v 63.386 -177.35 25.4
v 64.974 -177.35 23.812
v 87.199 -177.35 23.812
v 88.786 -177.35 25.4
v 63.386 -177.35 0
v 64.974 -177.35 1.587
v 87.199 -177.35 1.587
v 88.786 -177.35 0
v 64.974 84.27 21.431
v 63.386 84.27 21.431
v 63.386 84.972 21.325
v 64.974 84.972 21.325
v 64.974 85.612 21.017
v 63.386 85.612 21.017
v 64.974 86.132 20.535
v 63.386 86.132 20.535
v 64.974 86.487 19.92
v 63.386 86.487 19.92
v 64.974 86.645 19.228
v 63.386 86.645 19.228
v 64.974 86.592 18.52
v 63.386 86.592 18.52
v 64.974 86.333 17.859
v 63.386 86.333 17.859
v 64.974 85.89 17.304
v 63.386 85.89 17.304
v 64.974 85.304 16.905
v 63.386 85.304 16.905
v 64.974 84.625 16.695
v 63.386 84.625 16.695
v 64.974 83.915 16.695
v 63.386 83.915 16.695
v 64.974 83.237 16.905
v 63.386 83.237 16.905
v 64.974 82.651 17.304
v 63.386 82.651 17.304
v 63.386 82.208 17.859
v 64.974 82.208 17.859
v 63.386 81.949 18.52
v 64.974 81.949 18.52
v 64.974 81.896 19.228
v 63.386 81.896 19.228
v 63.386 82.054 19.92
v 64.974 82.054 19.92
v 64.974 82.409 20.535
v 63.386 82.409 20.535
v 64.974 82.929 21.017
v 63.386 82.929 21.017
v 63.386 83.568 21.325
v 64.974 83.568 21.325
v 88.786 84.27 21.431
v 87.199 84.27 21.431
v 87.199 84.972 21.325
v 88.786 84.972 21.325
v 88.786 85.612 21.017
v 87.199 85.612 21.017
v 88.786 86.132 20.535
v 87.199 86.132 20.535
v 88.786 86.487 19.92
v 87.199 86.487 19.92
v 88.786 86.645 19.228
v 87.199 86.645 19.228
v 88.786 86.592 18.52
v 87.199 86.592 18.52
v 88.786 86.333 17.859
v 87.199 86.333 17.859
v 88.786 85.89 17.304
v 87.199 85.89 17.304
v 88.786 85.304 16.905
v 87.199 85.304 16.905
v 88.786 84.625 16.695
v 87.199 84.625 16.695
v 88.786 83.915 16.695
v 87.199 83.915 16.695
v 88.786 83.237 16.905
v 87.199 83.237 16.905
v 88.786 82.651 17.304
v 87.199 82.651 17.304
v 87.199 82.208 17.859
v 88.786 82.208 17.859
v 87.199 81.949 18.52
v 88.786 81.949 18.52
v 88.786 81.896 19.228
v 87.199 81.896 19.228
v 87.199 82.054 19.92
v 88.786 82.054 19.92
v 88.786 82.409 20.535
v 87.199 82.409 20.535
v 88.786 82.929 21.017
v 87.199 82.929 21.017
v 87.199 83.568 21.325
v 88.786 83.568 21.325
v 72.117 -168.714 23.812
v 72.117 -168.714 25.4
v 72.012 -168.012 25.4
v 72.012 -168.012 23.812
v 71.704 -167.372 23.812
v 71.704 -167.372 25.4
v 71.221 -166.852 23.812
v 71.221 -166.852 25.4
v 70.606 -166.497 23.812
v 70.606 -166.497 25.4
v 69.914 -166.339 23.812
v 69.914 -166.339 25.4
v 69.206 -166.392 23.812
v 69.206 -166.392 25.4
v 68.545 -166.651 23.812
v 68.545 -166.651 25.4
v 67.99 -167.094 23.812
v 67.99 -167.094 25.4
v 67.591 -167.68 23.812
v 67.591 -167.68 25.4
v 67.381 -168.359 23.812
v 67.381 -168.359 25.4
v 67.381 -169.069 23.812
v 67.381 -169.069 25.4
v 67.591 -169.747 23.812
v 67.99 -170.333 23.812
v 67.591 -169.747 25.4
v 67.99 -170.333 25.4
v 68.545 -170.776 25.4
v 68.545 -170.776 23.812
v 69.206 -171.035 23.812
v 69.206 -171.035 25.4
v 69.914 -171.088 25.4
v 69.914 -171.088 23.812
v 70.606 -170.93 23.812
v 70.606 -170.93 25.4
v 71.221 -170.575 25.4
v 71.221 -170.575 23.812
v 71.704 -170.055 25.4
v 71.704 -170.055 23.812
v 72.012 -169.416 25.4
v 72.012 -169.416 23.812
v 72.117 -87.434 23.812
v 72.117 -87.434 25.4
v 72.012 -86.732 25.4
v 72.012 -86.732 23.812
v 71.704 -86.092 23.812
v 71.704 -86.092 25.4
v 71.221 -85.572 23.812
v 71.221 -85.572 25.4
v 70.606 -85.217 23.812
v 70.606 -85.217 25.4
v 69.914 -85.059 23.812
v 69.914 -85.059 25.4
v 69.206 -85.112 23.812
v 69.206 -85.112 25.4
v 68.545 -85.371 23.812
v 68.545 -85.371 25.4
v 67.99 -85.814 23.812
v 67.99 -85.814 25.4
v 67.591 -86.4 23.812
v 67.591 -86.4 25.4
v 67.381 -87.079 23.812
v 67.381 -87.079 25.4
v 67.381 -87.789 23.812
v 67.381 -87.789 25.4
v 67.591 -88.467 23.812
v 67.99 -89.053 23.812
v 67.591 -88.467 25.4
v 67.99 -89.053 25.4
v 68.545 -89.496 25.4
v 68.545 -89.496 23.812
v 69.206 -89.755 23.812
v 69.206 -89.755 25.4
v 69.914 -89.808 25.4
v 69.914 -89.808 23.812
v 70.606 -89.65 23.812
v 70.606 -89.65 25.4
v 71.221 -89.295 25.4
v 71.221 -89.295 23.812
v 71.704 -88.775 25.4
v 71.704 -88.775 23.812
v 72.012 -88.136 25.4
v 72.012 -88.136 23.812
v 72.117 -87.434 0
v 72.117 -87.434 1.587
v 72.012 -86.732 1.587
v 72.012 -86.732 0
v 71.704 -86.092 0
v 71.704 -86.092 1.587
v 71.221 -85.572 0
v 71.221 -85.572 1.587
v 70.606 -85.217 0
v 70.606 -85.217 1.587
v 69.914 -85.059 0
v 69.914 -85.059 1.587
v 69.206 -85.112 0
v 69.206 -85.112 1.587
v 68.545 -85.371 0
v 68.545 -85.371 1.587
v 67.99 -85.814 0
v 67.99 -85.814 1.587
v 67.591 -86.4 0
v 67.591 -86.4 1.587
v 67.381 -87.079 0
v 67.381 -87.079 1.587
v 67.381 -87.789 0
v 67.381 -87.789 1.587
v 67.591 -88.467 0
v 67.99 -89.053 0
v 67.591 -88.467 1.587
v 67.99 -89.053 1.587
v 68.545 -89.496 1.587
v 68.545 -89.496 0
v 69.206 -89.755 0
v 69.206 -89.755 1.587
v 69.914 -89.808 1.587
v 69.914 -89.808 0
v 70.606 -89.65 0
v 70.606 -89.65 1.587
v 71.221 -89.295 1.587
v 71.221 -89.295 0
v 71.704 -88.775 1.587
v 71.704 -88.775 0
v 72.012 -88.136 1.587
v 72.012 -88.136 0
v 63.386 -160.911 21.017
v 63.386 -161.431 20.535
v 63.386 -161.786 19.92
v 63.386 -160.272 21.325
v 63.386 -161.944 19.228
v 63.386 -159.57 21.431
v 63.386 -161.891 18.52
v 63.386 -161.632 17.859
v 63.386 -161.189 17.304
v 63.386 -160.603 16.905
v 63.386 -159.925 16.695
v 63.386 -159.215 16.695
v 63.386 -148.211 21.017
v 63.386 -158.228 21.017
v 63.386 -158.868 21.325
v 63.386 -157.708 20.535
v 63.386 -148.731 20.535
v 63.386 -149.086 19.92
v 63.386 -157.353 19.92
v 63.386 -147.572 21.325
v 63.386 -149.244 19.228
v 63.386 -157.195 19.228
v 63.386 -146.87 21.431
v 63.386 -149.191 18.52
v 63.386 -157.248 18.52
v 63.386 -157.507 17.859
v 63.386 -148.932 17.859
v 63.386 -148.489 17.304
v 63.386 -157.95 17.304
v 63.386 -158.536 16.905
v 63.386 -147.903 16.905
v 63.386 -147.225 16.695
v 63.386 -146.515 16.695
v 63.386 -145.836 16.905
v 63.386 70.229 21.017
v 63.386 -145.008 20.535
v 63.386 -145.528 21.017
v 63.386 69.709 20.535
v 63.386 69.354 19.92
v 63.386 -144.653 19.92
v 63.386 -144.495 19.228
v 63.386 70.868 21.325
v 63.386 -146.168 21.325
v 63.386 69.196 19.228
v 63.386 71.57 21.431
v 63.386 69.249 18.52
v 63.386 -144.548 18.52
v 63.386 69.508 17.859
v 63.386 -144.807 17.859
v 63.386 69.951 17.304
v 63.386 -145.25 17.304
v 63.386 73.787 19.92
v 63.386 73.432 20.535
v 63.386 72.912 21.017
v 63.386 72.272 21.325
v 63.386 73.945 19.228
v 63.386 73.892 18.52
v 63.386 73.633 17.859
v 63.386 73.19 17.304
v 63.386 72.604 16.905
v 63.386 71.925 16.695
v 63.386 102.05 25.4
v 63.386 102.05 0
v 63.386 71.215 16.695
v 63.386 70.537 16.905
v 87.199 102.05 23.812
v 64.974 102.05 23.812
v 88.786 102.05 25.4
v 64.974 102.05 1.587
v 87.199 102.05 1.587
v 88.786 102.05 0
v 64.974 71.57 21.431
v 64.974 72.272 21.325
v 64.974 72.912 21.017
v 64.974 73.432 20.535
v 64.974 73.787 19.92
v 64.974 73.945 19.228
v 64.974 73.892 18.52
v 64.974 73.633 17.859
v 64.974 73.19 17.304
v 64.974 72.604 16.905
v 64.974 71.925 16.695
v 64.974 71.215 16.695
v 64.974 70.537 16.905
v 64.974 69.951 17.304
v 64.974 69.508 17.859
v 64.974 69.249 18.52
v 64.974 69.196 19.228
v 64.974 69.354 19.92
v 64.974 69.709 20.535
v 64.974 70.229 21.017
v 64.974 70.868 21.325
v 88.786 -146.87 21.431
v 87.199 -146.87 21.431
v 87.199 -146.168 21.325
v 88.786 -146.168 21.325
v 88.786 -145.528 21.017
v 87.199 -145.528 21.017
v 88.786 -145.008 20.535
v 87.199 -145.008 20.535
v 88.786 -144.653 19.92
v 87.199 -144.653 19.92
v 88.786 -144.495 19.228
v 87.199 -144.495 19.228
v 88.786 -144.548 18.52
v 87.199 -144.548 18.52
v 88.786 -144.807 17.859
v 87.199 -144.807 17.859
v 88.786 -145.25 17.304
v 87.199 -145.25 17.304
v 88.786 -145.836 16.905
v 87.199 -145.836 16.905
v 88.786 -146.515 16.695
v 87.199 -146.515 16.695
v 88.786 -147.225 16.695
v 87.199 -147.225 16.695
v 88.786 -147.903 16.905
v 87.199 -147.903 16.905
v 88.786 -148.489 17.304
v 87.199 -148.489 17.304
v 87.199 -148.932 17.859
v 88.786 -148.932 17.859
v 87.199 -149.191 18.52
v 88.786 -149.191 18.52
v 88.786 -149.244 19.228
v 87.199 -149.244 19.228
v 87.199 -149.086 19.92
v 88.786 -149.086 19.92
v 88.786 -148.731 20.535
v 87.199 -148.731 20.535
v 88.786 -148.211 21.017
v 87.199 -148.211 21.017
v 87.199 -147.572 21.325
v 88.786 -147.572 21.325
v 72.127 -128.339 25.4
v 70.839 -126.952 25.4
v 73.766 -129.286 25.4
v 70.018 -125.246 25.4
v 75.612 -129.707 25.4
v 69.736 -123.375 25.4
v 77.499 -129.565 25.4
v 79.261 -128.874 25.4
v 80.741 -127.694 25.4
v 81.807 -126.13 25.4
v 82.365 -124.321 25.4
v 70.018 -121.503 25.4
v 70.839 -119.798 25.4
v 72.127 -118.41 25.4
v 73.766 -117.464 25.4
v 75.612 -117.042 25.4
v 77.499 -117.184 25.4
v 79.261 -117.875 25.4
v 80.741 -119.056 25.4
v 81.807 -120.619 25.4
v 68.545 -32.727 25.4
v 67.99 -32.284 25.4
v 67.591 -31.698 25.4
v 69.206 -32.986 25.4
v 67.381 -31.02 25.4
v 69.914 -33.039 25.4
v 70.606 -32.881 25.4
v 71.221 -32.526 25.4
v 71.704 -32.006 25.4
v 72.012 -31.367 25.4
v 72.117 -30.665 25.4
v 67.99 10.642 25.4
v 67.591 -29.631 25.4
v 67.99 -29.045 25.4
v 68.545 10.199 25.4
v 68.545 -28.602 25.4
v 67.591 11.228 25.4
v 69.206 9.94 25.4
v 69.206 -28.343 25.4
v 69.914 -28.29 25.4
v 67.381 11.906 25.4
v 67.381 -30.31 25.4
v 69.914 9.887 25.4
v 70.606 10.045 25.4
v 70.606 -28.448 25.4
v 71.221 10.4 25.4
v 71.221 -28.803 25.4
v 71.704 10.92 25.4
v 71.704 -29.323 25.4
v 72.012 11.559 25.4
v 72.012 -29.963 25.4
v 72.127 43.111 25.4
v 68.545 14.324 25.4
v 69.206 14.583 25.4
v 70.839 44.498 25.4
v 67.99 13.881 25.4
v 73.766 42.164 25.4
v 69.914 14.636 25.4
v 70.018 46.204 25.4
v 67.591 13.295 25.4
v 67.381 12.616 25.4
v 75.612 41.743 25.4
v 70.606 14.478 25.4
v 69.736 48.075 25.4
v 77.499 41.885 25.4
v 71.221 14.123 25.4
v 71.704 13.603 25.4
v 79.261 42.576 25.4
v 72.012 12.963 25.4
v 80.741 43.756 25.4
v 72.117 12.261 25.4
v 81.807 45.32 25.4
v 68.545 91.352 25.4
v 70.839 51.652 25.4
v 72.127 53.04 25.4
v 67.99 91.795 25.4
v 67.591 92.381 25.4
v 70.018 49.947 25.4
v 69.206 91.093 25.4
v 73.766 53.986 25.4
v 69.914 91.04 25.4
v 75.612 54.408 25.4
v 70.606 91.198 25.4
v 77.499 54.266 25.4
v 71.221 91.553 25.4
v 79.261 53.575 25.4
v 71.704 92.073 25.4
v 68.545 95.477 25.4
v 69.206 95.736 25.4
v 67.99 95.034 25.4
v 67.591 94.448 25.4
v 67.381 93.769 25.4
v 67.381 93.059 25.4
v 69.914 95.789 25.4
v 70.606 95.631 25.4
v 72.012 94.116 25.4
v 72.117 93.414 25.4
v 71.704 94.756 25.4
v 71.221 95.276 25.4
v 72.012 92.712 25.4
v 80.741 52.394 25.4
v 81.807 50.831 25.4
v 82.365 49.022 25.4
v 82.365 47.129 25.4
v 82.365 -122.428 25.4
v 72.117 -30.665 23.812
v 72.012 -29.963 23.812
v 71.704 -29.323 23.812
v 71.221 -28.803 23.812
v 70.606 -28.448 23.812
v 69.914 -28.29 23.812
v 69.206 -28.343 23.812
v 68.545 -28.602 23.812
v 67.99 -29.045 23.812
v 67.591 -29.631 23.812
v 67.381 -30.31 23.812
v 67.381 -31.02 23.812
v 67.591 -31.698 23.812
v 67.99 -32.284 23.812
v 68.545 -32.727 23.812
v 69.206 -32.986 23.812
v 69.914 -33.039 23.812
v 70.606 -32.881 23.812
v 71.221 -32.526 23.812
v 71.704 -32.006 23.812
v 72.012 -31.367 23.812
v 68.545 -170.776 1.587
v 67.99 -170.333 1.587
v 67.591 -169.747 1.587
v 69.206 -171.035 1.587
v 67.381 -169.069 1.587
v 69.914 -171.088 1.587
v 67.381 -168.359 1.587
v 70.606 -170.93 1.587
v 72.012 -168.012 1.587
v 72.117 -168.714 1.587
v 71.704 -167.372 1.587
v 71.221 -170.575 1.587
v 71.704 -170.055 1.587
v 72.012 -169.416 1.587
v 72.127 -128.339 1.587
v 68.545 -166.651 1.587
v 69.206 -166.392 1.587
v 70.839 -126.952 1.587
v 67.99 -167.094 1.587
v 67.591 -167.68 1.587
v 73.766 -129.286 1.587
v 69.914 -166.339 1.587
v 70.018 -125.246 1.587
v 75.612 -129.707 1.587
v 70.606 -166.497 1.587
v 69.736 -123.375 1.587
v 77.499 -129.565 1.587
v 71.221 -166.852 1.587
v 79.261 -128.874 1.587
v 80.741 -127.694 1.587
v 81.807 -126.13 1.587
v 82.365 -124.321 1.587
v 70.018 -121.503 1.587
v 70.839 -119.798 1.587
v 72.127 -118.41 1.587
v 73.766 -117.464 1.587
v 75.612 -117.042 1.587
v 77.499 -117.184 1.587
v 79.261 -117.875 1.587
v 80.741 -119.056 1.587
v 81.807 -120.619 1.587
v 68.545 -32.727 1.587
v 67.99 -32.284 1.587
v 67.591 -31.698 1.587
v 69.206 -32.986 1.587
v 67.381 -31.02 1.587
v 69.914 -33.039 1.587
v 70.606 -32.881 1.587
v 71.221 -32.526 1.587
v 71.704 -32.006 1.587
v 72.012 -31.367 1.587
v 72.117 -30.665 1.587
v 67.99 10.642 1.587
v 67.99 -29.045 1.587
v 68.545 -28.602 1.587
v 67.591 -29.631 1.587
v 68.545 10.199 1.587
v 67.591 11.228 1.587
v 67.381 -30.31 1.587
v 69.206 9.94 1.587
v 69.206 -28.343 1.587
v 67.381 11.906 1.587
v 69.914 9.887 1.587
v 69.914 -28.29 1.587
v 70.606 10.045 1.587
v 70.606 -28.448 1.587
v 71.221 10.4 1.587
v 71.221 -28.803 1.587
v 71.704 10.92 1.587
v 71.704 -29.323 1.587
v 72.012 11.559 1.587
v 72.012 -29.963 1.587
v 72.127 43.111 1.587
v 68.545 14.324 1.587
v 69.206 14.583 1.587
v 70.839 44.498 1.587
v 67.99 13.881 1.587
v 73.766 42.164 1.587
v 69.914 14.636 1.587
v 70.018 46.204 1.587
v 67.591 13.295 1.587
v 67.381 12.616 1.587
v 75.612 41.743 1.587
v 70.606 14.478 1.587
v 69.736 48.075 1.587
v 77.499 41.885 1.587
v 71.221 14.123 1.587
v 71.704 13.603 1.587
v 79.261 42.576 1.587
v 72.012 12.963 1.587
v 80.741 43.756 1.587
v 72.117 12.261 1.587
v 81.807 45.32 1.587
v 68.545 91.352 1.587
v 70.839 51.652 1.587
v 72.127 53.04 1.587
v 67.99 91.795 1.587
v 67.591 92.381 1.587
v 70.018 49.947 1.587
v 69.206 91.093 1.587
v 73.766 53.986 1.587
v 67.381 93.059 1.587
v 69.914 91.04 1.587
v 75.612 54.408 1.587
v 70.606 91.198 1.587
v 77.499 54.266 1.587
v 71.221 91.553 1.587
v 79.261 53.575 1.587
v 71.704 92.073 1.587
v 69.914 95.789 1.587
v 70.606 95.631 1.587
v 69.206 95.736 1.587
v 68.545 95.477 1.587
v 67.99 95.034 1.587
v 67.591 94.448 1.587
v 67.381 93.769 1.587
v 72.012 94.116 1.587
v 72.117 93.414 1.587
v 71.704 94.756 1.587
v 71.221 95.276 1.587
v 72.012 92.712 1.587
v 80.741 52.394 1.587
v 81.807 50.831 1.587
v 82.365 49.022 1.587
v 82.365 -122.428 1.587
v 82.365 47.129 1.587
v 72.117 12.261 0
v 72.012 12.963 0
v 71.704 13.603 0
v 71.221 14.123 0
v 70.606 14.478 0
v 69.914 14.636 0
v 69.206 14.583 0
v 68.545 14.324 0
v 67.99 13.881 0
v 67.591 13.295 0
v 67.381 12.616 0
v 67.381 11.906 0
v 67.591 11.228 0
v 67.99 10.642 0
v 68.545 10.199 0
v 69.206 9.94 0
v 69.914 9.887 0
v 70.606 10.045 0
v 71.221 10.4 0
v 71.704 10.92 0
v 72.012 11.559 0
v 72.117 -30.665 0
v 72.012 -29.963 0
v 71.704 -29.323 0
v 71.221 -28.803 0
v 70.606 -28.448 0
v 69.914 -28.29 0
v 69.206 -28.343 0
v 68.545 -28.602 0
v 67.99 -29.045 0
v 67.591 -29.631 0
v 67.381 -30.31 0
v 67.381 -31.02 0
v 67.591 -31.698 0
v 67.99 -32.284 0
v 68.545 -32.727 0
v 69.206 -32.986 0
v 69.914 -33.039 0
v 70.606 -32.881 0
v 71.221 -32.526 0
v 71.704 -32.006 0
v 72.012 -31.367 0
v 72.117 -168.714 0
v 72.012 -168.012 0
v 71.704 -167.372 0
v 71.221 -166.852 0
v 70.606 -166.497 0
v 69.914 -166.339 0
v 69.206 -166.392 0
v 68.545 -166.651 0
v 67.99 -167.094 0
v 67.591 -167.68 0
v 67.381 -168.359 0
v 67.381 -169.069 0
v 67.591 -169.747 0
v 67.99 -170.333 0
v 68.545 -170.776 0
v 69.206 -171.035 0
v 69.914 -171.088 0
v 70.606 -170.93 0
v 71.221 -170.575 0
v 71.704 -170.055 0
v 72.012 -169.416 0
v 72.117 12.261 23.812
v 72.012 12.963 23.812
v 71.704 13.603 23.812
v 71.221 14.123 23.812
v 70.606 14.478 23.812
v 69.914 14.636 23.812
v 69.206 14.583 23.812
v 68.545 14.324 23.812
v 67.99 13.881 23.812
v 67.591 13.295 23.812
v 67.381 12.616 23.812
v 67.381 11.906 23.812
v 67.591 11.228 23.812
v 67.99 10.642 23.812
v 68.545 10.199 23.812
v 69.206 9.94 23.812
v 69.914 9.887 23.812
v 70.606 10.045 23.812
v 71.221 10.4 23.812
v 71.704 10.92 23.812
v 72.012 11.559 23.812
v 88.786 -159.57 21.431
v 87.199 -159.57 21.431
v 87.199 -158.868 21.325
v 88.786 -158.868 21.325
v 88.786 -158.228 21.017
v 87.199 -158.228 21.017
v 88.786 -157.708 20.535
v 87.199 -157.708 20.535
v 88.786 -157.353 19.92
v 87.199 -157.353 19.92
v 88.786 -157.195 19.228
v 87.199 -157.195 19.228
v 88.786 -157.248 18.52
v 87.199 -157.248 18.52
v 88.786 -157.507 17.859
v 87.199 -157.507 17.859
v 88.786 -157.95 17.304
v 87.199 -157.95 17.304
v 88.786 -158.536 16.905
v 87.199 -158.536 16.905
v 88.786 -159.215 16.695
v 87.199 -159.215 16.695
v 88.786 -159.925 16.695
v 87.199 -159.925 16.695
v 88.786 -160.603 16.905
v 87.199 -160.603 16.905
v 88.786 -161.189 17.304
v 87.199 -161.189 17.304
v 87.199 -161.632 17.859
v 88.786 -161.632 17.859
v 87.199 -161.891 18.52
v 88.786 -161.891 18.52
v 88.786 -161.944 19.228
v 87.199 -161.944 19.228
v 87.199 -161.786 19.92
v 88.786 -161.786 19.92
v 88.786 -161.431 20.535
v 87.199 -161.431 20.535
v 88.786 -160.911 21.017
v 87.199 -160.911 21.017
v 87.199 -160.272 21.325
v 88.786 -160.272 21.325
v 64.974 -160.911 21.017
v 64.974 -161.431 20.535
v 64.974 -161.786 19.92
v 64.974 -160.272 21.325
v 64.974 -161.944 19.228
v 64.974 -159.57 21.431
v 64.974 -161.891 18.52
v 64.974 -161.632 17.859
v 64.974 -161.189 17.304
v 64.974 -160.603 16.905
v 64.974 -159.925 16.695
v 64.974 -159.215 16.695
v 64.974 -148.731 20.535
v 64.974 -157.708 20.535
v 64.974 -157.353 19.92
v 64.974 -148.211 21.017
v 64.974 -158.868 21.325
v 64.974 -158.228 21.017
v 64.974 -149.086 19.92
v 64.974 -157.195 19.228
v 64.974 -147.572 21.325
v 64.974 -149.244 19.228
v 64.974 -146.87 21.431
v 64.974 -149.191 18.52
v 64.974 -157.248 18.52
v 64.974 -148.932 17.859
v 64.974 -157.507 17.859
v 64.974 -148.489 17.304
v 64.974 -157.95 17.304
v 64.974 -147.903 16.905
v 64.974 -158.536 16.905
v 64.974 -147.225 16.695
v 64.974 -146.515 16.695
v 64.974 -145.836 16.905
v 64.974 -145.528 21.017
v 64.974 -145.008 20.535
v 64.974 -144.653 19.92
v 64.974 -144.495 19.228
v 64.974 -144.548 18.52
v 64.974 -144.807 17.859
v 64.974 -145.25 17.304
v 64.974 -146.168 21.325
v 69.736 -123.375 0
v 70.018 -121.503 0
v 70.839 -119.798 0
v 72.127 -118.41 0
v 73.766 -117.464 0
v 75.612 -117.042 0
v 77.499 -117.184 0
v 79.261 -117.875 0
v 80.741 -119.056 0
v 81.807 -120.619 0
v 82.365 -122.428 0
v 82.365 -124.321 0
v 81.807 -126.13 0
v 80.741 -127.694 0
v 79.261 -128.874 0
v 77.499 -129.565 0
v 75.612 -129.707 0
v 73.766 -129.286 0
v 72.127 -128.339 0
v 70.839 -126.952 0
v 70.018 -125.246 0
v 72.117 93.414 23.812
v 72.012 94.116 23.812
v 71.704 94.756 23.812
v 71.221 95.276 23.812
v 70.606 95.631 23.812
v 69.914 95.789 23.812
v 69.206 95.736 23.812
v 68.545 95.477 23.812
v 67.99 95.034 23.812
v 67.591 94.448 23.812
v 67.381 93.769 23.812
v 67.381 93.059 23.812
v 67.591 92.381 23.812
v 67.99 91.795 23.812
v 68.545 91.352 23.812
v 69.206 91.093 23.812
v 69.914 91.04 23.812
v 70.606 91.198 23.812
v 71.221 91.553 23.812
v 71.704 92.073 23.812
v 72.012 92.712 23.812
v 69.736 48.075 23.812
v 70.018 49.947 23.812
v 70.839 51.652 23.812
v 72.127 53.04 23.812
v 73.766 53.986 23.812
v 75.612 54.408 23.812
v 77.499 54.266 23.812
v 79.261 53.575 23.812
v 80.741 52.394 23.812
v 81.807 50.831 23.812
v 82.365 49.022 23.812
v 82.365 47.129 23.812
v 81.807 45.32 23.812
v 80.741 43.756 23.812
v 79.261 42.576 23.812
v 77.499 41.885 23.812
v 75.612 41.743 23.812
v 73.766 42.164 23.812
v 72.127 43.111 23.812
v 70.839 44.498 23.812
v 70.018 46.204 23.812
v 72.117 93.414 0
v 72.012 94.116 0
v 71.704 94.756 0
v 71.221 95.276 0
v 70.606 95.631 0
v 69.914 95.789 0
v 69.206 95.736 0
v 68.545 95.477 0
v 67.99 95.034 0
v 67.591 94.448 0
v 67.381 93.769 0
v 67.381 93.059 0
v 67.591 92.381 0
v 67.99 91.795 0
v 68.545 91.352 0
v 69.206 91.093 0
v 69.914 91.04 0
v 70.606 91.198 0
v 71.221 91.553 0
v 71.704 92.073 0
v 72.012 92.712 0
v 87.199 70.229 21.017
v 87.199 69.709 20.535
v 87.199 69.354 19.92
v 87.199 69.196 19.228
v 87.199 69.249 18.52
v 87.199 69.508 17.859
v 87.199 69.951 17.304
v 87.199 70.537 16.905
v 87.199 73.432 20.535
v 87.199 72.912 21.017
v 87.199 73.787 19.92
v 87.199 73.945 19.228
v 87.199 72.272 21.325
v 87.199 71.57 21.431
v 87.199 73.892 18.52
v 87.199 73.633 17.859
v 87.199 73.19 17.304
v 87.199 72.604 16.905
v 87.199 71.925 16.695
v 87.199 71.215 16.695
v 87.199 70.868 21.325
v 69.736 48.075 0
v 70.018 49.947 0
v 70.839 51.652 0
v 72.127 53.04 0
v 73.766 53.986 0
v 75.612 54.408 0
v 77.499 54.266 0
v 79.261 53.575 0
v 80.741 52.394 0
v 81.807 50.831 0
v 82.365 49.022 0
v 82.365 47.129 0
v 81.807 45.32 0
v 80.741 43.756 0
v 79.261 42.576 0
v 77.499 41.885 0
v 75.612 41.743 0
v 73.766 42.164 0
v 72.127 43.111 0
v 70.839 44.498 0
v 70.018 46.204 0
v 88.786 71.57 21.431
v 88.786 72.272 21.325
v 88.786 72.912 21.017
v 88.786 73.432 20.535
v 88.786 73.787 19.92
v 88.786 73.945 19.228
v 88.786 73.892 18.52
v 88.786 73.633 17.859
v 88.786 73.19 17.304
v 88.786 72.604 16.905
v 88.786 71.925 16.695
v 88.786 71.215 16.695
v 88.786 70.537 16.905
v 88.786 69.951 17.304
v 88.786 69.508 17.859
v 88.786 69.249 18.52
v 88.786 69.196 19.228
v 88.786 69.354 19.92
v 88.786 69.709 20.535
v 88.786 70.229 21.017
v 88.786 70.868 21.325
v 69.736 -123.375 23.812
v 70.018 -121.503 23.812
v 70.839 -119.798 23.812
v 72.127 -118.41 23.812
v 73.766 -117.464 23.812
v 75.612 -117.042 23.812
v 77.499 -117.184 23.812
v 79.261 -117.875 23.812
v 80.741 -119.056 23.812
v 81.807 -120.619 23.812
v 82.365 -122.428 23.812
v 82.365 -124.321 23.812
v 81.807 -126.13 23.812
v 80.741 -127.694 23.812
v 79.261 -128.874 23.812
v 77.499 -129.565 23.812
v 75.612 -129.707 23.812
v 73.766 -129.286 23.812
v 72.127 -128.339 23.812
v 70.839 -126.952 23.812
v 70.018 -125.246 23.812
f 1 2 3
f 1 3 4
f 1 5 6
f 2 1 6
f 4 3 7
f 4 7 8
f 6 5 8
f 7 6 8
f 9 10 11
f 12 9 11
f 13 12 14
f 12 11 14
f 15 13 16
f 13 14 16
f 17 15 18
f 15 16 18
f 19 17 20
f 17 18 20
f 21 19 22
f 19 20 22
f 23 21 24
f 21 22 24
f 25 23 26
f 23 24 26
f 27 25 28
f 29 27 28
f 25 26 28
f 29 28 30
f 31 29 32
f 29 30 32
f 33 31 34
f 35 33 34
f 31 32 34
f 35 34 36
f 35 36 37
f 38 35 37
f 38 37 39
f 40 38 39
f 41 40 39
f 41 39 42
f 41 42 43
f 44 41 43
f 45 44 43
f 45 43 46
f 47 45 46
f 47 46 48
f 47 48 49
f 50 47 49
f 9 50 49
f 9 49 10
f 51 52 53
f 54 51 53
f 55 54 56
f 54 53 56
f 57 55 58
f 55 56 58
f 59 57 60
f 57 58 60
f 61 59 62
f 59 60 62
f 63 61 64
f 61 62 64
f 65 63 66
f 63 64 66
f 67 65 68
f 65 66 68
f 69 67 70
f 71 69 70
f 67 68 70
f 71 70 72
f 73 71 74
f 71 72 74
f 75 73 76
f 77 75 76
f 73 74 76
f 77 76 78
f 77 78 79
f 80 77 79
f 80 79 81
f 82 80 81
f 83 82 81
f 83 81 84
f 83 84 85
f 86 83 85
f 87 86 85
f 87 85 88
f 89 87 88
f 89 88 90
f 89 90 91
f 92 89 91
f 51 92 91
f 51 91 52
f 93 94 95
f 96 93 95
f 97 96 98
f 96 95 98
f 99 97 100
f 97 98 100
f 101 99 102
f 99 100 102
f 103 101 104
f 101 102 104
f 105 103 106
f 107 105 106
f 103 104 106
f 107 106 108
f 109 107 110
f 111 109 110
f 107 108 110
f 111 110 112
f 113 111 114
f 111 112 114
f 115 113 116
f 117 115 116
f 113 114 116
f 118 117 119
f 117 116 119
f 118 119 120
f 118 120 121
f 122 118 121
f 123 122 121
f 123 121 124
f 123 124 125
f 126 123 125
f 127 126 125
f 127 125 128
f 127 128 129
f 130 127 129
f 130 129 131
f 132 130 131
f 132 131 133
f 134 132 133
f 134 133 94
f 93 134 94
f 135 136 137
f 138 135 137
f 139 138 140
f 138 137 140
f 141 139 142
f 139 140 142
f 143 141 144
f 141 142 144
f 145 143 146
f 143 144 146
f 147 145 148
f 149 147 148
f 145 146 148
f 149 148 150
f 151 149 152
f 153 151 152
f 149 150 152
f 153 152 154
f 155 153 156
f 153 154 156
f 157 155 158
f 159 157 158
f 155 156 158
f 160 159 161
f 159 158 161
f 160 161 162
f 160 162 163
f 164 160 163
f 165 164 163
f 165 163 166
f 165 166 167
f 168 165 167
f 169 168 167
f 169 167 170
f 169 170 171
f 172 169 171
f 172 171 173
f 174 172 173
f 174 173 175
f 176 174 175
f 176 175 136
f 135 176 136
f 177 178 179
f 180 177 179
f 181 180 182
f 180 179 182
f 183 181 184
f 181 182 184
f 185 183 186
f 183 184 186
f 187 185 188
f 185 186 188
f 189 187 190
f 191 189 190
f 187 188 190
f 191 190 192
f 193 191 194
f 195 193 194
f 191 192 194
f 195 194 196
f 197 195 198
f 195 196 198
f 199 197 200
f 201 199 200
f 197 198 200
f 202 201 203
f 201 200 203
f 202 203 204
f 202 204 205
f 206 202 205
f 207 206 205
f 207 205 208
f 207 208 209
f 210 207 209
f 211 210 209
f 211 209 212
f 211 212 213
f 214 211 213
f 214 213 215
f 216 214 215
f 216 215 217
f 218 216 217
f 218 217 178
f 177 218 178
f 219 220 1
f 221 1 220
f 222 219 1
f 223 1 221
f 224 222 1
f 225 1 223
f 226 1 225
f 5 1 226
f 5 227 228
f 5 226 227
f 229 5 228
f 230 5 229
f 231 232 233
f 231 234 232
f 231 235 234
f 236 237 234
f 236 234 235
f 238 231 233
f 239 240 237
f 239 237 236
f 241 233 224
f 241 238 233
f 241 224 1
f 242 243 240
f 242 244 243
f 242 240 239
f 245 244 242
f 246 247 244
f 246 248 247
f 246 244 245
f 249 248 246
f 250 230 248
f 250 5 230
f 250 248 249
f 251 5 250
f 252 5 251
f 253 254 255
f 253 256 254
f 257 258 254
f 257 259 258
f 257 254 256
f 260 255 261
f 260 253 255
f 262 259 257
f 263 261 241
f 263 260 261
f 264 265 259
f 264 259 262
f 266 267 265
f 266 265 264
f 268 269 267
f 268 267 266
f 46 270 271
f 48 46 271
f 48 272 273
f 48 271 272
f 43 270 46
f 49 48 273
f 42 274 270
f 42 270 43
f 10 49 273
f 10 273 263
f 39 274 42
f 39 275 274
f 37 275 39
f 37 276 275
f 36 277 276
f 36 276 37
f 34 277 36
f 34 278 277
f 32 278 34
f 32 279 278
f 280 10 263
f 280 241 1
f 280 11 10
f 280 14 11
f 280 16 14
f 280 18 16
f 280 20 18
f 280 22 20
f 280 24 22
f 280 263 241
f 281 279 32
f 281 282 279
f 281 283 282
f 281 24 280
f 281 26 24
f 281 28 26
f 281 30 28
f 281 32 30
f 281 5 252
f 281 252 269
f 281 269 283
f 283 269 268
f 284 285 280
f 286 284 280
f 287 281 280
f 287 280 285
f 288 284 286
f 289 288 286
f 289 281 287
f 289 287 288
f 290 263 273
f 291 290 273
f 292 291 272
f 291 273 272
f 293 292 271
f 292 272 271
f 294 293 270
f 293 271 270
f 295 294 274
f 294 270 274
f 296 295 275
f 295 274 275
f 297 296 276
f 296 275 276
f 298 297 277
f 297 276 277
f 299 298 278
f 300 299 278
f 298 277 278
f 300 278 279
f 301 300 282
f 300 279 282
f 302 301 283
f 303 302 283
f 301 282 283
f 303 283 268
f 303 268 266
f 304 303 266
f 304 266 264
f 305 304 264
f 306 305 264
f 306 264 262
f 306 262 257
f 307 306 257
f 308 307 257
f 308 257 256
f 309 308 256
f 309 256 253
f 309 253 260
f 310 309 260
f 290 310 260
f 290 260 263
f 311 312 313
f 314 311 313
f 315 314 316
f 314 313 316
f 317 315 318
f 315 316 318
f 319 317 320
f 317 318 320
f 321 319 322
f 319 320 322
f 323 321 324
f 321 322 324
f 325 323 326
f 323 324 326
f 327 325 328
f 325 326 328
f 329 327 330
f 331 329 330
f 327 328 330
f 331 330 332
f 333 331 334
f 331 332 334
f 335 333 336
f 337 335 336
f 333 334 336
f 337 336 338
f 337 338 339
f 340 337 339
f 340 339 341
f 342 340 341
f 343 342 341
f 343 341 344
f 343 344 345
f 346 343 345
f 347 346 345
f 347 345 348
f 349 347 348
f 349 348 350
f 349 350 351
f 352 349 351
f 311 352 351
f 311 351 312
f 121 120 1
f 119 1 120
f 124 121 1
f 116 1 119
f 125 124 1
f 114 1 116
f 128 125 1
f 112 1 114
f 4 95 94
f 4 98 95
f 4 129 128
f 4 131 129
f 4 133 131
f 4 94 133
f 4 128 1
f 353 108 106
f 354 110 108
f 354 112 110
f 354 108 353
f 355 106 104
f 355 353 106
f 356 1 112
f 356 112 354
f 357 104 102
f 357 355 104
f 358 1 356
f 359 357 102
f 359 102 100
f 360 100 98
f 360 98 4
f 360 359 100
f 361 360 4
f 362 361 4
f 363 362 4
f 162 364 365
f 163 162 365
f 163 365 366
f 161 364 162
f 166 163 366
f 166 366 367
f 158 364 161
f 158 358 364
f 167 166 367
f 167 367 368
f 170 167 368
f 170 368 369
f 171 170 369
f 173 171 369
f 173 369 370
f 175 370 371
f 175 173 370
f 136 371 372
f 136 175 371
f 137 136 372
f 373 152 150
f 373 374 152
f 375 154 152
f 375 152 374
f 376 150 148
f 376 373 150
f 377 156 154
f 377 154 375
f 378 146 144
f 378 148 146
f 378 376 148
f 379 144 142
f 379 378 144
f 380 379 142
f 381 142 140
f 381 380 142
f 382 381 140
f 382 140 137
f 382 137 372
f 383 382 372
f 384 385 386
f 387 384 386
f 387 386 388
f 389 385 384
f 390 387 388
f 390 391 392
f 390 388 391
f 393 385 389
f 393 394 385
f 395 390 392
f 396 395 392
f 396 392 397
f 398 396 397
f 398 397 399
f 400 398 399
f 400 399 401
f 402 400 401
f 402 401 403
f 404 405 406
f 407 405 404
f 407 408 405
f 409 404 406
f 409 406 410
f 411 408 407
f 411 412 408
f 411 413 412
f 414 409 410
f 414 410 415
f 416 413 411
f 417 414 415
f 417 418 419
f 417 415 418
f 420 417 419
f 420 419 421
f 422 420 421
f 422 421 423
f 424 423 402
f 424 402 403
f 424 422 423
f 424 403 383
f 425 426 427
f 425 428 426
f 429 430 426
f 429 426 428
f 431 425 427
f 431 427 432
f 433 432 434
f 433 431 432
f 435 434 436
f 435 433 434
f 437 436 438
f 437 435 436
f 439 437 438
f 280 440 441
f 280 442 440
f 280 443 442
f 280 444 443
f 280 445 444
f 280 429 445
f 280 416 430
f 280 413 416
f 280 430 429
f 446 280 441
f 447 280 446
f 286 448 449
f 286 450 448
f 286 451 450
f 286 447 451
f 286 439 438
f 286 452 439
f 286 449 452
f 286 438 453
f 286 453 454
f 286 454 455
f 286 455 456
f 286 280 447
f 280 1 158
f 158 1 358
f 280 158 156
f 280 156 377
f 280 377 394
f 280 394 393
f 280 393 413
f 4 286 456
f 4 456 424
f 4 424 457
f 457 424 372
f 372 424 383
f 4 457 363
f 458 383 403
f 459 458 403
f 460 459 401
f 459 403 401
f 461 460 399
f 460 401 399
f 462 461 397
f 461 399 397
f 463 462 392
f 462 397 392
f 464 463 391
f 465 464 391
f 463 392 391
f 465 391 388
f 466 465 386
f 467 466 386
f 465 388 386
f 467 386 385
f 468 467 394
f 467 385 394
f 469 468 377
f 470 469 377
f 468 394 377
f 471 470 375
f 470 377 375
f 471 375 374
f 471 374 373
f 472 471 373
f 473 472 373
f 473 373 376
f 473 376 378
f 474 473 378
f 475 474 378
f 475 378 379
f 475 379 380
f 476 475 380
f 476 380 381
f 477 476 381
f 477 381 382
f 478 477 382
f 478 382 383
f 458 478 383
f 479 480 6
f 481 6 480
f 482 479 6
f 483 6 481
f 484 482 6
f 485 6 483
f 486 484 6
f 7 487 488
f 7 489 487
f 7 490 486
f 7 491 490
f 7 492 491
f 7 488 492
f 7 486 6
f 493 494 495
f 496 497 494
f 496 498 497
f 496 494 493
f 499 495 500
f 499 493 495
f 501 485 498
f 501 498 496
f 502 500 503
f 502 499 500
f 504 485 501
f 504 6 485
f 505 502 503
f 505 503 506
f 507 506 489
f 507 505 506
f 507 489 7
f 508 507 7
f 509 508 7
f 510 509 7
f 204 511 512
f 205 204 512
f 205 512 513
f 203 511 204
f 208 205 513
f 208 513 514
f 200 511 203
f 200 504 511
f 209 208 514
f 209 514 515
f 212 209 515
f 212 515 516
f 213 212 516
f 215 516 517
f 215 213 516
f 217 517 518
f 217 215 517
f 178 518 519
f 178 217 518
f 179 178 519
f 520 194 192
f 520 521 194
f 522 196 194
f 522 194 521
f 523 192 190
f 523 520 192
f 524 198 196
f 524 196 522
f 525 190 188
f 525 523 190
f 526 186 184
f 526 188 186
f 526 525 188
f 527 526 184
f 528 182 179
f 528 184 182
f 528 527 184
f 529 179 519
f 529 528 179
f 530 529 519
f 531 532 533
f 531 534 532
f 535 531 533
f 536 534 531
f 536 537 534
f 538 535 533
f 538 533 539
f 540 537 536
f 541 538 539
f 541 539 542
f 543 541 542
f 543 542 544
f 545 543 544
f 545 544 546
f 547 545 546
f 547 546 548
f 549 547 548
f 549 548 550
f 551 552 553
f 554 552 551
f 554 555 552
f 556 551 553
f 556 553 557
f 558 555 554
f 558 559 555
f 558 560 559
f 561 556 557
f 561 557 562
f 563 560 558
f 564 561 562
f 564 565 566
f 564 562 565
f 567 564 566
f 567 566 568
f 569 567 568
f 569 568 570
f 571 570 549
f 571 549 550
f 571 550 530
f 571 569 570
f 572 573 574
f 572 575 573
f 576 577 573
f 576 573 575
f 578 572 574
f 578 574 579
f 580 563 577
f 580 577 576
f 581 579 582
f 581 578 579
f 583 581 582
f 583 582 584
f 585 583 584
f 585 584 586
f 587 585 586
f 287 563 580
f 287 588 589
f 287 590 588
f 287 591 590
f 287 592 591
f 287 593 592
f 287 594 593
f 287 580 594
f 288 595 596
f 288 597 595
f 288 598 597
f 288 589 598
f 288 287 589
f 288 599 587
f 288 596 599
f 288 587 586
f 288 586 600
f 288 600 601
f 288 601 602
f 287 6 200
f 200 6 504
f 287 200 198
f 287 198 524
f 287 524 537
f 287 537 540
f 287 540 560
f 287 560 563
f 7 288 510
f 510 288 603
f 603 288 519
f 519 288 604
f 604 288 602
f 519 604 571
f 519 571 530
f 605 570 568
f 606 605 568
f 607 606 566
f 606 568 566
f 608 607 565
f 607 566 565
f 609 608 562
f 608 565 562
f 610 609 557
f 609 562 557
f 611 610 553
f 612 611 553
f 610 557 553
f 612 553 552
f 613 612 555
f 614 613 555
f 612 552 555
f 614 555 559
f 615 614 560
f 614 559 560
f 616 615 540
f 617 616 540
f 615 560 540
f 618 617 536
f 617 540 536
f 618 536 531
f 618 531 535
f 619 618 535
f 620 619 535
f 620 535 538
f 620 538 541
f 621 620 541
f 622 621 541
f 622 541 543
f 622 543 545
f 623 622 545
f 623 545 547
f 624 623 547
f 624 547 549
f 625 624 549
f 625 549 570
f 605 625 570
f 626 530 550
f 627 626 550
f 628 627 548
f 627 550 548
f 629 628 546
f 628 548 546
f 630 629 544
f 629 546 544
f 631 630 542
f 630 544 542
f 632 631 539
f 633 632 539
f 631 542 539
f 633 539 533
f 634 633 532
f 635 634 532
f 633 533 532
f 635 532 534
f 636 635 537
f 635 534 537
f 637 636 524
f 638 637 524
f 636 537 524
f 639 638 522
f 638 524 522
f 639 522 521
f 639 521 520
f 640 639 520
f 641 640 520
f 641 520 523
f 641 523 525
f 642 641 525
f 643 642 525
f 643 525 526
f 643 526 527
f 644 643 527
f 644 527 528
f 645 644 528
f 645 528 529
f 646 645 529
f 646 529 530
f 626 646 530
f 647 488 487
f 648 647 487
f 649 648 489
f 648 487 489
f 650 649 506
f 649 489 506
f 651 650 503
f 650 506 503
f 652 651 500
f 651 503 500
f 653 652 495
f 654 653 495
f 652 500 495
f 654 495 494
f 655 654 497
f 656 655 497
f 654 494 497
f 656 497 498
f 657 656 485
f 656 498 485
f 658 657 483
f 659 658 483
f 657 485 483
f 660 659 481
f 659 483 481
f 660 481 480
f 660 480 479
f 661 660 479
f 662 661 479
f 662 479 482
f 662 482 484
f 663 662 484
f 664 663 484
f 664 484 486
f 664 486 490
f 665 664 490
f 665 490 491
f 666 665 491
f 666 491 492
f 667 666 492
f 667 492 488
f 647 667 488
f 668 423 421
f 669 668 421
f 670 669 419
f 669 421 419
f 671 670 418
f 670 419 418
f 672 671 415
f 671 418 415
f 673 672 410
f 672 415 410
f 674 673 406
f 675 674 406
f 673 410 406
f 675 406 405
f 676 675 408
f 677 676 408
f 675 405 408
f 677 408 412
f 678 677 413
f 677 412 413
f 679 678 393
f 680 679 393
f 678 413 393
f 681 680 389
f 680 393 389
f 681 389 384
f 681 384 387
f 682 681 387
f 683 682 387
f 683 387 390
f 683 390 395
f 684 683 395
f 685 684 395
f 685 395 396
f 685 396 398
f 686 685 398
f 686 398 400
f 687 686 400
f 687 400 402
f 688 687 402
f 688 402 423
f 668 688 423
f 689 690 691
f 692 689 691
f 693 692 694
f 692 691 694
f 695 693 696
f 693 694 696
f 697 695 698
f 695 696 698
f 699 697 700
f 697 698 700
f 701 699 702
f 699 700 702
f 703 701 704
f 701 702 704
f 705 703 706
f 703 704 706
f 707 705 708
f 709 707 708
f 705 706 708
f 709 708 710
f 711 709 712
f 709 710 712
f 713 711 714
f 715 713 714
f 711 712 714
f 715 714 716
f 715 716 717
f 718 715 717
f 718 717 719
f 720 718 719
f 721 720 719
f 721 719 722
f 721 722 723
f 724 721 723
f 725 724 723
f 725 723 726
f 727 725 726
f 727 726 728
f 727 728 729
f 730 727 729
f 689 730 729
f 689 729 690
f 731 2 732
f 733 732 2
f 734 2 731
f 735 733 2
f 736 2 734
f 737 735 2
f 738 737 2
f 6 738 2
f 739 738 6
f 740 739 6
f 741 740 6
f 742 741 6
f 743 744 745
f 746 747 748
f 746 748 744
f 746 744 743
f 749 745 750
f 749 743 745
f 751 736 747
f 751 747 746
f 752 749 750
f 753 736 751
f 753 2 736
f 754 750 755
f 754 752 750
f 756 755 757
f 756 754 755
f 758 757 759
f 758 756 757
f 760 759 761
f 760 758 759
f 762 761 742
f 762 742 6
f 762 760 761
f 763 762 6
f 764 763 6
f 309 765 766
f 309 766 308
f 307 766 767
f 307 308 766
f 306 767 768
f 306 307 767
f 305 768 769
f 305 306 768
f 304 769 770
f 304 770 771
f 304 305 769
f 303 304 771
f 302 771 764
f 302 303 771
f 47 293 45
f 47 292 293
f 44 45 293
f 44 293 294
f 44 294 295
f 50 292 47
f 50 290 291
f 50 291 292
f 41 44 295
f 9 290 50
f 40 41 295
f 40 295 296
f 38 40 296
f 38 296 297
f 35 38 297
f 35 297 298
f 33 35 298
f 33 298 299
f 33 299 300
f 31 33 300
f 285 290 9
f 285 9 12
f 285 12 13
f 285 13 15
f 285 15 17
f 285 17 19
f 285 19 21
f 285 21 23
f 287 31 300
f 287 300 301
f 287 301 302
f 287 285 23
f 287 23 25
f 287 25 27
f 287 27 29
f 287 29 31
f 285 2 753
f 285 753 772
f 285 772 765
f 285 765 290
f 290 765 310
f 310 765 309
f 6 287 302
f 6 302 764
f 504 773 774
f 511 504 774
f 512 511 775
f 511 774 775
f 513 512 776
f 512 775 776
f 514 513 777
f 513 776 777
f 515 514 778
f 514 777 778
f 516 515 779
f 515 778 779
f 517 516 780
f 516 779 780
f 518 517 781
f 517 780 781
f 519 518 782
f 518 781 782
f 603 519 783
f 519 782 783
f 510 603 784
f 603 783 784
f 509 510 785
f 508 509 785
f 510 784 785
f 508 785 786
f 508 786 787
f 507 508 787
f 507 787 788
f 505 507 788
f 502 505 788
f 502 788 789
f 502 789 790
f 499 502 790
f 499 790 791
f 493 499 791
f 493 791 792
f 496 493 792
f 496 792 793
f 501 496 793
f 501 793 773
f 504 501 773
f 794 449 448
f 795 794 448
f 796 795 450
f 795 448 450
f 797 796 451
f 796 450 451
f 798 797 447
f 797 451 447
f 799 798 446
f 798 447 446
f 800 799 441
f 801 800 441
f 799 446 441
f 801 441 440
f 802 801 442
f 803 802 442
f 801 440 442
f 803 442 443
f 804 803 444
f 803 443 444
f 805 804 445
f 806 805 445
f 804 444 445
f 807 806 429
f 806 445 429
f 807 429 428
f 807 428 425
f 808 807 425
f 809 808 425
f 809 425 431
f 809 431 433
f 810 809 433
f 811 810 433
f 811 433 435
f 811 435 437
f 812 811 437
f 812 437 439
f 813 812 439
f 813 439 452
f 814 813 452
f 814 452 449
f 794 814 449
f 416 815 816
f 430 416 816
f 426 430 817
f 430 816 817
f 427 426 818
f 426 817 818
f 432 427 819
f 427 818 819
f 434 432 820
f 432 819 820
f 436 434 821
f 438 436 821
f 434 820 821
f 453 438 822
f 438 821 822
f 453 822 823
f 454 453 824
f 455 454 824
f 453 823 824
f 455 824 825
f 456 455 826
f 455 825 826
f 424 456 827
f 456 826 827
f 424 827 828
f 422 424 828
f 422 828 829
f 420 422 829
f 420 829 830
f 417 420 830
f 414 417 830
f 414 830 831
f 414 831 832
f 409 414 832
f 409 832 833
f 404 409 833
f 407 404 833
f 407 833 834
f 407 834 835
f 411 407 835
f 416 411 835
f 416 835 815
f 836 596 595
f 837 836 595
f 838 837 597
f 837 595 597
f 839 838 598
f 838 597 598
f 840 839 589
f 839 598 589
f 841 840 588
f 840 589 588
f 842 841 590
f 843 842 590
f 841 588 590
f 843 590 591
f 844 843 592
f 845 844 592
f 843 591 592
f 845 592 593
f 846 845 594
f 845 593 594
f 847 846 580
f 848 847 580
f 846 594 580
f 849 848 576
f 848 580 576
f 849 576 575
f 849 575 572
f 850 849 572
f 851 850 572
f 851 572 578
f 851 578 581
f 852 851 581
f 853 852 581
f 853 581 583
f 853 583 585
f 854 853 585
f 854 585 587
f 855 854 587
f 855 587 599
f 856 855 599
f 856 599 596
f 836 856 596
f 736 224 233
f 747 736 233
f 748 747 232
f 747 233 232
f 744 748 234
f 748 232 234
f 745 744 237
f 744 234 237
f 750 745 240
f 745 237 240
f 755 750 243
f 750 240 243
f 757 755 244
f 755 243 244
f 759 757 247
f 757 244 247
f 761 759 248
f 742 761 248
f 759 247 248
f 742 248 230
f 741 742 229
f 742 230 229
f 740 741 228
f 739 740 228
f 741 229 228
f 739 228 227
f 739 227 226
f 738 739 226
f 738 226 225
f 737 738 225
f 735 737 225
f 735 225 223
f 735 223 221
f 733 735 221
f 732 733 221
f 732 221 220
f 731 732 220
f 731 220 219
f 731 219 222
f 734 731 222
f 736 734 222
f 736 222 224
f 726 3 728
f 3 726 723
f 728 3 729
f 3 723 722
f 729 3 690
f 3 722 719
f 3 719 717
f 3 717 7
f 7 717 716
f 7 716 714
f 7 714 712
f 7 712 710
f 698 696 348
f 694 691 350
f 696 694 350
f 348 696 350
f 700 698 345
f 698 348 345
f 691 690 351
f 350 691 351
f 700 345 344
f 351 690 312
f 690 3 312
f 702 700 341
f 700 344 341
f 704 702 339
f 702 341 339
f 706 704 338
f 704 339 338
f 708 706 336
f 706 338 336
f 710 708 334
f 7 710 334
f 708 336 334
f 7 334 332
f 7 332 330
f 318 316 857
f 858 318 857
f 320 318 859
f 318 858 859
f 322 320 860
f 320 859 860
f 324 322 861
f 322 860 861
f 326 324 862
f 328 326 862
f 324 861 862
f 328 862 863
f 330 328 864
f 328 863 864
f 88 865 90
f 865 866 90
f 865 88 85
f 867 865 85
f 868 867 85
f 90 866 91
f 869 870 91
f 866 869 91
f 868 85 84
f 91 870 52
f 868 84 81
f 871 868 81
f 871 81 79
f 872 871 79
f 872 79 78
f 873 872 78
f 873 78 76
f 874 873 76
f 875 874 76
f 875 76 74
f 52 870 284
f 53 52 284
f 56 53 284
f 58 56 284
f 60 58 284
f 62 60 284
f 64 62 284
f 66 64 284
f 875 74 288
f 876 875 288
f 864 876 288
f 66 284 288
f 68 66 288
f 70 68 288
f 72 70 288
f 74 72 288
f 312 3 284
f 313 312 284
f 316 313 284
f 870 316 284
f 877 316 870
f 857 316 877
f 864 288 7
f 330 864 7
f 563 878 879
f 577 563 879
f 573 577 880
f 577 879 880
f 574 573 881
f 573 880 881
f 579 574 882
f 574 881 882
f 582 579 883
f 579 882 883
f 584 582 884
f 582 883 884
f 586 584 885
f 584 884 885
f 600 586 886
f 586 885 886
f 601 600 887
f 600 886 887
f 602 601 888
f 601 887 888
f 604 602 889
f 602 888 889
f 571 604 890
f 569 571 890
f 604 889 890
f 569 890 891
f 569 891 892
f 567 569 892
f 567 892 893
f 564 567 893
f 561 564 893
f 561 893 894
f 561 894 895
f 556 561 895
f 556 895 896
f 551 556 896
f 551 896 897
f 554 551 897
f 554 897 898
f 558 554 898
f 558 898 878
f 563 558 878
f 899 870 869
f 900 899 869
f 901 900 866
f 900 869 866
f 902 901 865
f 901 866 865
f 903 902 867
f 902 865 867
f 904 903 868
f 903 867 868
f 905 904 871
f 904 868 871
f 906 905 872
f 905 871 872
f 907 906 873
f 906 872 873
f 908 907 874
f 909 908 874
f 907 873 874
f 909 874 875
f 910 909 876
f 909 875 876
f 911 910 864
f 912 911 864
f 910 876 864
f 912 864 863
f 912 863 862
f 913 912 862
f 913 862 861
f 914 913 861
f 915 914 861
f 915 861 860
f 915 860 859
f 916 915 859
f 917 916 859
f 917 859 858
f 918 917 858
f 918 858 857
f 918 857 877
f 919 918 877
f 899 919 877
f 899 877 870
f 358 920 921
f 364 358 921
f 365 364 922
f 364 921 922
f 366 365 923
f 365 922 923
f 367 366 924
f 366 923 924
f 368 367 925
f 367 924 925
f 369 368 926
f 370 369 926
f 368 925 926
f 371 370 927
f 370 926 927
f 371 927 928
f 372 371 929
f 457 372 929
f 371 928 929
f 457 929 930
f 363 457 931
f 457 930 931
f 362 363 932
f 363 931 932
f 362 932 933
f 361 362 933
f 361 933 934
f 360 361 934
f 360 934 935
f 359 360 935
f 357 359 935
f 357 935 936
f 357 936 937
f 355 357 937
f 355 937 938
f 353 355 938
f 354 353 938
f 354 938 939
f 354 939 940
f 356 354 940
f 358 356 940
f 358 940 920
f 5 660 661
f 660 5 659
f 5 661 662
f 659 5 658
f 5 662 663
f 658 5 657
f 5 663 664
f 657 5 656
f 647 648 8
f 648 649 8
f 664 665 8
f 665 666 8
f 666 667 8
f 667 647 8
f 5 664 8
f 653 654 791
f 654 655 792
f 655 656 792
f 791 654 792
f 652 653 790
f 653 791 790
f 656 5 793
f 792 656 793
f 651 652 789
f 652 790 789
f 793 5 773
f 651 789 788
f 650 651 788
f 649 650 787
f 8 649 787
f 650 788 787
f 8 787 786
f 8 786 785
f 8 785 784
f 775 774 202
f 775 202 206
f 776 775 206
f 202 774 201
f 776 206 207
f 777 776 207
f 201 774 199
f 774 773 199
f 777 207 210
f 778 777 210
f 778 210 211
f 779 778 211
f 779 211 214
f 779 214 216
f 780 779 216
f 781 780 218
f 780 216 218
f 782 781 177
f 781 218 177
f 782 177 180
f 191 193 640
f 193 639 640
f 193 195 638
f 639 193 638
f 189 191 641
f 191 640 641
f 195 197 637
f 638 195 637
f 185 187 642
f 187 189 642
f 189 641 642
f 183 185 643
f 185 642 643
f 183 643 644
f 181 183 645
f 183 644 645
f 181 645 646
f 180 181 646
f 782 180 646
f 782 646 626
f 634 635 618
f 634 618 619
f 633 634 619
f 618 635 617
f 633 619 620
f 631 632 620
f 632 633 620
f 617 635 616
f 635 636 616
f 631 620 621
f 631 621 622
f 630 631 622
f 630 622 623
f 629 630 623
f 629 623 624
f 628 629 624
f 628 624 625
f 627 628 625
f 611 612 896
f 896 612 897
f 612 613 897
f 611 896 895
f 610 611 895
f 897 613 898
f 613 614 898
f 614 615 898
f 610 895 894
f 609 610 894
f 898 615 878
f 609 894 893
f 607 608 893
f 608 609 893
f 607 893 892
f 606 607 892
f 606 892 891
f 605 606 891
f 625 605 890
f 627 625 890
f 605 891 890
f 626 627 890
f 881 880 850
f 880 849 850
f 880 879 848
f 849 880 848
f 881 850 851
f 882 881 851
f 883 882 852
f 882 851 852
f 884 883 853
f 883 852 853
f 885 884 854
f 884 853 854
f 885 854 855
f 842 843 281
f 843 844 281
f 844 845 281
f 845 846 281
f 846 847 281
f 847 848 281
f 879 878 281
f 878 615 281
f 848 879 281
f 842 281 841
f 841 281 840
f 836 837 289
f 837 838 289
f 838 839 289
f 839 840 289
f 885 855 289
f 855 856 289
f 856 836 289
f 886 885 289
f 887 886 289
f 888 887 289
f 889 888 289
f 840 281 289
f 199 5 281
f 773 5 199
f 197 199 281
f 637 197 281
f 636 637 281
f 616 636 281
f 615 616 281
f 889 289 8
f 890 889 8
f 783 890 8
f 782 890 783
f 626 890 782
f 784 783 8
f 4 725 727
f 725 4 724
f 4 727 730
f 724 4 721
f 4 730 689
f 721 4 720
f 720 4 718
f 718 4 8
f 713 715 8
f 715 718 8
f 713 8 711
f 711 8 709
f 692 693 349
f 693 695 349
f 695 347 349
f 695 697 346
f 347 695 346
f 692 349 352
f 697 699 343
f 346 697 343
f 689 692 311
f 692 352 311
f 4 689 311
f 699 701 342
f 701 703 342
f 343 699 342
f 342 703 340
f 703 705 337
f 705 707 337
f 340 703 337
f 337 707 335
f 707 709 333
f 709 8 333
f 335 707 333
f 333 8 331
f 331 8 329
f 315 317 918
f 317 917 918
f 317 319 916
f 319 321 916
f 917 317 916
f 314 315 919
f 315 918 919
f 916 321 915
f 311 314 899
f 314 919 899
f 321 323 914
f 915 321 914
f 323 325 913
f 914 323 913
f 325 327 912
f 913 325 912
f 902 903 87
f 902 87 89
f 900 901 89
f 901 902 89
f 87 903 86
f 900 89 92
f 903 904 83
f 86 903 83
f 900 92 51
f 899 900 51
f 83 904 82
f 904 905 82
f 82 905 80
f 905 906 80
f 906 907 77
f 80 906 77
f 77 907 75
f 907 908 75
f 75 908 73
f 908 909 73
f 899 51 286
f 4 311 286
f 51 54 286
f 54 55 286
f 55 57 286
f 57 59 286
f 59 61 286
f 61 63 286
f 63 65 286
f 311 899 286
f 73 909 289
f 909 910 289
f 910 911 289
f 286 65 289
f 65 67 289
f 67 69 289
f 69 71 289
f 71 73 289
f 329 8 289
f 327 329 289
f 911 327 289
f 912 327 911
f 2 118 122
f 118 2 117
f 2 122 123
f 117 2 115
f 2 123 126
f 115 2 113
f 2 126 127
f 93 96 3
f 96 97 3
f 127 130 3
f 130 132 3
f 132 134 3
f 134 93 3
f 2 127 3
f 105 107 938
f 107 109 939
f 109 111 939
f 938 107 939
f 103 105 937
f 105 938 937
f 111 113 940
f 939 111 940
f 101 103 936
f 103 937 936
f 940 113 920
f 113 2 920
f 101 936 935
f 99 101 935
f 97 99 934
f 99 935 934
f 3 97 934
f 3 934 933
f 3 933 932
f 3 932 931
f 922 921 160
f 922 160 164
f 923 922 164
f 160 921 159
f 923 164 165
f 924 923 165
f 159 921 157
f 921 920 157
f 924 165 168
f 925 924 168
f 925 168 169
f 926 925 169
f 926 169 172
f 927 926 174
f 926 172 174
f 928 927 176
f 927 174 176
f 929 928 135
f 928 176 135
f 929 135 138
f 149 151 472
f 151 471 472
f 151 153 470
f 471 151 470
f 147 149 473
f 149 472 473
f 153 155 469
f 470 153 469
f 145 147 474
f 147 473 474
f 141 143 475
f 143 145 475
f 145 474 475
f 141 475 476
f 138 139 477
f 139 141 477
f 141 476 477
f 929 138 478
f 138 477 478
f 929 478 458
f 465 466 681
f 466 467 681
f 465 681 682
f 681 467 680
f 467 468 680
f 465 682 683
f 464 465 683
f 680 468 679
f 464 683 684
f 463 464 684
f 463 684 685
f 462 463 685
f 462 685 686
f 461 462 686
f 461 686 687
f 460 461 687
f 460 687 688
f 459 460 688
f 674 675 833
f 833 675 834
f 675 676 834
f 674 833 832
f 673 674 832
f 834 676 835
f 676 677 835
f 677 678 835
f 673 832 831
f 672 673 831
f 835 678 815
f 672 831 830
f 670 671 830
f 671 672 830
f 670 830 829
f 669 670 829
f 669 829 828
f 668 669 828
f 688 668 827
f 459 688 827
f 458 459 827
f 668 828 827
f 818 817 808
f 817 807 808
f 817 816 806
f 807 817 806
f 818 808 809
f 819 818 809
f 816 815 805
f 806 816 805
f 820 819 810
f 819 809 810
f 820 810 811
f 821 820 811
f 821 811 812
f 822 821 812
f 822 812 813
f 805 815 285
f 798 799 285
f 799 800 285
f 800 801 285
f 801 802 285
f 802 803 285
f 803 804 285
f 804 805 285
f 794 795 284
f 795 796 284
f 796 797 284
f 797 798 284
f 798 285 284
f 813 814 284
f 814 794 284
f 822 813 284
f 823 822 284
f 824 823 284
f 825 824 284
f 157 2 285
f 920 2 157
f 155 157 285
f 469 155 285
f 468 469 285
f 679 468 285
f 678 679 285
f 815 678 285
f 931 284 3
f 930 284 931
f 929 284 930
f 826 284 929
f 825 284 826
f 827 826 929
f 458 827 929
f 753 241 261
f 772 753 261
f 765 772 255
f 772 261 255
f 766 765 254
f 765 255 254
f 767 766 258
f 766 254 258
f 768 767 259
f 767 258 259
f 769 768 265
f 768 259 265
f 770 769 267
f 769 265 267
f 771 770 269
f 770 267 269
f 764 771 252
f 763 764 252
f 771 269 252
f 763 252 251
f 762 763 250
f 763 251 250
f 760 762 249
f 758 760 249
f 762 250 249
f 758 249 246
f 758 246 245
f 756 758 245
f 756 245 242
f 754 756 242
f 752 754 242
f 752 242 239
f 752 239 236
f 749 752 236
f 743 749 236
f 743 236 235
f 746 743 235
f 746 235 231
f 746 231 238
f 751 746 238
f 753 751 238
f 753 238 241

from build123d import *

# Parameters (mm, degrees)
SKETCH1_W                      = 25.4
SKETCH1_H                      = 279.4
BOSS_EXTRUDE1_DEPTH            = 25.4
SKETCH2_W                      = 22.225
SKETCH2_H                      = 22.225
CUT_EXTRUDE1_DEPTH             = 279.4
SKETCH3_R                      = 6.35
CUT_EXTRUDE2_DEPTH             = 25.4
F_3_16_0_1875_DIAMETER_HOLE2_D = 4.7625
F_3_16_0_1875_DIAMETER_HOLE3_D = 4.7625


with BuildPart() as part:
    # Sketch1 → Boss-Extrude1 (new body)
    with BuildSketch(Plane.XY):
        with Locations((76.086049872, -37.64964539)):
            Rectangle(SKETCH1_W, SKETCH1_H)
    extrude(amount=BOSS_EXTRUDE1_DEPTH)

    # Sketch2 → Cut-Extrude1 (cut)
    with BuildSketch(Plane(origin=(0, 102.05035461, 0), x_dir=(1, 0, 0), z_dir=(0, 1, 0))):
        with Locations((76.086049872, -12.7)):
            Rectangle(SKETCH2_W, SKETCH2_H)
    extrude(amount=-CUT_EXTRUDE1_DEPTH, mode=Mode.SUBTRACT)

    # Sketch3 → Cut-Extrude2 (cut)
    with BuildSketch(Plane(origin=(0, 0, 0), x_dir=(-1, 0, 0), z_dir=(0, 0, -1))):
        with Locations((-76.086049872, 48.07535461)):
            Circle(SKETCH3_R)
        with Locations((-76.086049872, -123.37464539)):
            Circle(SKETCH3_R)
    extrude(amount=-CUT_EXTRUDE2_DEPTH, mode=Mode.SUBTRACT)

    # 3/16 (0.1875) Diameter Hole2 (through all)
    with Locations(Plane(origin=(0, 0, 0), x_dir=(-1, 0, 0), z_dir=(0, 0, -1))):
        with Locations((-69.736049872, 93.41435461), (-69.736049872, 12.26135461), (-69.736049872, -30.66464539), (-69.736049872, -87.43364539), (-69.736049872, -168.71364539)):
            Hole(F_3_16_0_1875_DIAMETER_HOLE2_D / 2)

    # 3/16 (0.1875) Diameter Hole3 (through all)
    with Locations(Plane(origin=(88.786049872, 0, 0), x_dir=(0, 0, -1), z_dir=(1, 0, 0))):
        with Locations((-19.05, -159.56964539), (-19.05, -146.86964539), (-19.05, 71.57035461), (-19.05, 84.27035461)):
            Hole(F_3_16_0_1875_DIAMETER_HOLE3_D / 2)


solid = part.part
